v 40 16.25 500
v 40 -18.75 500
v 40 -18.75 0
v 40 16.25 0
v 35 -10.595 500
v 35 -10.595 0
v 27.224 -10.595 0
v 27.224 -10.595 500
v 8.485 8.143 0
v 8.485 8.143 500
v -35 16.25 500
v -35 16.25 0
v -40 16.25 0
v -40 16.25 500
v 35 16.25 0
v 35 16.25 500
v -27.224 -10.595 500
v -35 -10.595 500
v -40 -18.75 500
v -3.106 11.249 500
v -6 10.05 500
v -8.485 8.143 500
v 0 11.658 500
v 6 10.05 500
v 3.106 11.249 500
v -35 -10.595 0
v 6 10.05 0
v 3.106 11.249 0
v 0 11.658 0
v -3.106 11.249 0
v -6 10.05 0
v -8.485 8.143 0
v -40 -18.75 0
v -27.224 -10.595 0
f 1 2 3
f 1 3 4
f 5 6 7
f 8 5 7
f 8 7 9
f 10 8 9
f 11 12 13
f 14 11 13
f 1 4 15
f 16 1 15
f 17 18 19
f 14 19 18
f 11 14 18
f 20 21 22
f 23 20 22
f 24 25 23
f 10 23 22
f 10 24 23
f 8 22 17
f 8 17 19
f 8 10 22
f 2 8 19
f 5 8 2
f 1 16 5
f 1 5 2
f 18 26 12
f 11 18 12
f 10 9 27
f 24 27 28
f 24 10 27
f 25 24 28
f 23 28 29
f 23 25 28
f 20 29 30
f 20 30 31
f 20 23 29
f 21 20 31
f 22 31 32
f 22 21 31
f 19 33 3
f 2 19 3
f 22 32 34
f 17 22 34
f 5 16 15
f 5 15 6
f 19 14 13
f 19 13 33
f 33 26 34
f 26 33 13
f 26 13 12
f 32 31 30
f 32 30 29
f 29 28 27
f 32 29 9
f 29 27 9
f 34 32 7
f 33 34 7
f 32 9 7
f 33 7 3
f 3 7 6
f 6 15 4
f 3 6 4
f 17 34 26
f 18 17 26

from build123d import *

# Parameters (mm, degrees)
BOSS_EXTRUDE1_DEPTH = 500
FILLET1_R           = 12


with BuildPart() as part:
    # Sketch1 → Boss-Extrude1 (new body)
    with BuildSketch(Plane.XY):
        Polygon((-40, 16.25), (-40, -18.75), (40, -18.75), (40, 16.25), (35, 16.25), (35, -10.594931419), (27.223611076, -10.594931419), (0, 16.628679656), (-27.223611076, -10.594931419), (-35, -10.594931419), (-35, 16.25), align=None)
    extrude(amount=BOSS_EXTRUDE1_DEPTH)

    # Fillet1
    fillet1_edges = [part.edges().sort_by_distance(p)[0] for p in [
        (0, 16.628679656, 250),
    ]]
    fillet(fillet1_edges, radius=FILLET1_R)


solid = part.part
